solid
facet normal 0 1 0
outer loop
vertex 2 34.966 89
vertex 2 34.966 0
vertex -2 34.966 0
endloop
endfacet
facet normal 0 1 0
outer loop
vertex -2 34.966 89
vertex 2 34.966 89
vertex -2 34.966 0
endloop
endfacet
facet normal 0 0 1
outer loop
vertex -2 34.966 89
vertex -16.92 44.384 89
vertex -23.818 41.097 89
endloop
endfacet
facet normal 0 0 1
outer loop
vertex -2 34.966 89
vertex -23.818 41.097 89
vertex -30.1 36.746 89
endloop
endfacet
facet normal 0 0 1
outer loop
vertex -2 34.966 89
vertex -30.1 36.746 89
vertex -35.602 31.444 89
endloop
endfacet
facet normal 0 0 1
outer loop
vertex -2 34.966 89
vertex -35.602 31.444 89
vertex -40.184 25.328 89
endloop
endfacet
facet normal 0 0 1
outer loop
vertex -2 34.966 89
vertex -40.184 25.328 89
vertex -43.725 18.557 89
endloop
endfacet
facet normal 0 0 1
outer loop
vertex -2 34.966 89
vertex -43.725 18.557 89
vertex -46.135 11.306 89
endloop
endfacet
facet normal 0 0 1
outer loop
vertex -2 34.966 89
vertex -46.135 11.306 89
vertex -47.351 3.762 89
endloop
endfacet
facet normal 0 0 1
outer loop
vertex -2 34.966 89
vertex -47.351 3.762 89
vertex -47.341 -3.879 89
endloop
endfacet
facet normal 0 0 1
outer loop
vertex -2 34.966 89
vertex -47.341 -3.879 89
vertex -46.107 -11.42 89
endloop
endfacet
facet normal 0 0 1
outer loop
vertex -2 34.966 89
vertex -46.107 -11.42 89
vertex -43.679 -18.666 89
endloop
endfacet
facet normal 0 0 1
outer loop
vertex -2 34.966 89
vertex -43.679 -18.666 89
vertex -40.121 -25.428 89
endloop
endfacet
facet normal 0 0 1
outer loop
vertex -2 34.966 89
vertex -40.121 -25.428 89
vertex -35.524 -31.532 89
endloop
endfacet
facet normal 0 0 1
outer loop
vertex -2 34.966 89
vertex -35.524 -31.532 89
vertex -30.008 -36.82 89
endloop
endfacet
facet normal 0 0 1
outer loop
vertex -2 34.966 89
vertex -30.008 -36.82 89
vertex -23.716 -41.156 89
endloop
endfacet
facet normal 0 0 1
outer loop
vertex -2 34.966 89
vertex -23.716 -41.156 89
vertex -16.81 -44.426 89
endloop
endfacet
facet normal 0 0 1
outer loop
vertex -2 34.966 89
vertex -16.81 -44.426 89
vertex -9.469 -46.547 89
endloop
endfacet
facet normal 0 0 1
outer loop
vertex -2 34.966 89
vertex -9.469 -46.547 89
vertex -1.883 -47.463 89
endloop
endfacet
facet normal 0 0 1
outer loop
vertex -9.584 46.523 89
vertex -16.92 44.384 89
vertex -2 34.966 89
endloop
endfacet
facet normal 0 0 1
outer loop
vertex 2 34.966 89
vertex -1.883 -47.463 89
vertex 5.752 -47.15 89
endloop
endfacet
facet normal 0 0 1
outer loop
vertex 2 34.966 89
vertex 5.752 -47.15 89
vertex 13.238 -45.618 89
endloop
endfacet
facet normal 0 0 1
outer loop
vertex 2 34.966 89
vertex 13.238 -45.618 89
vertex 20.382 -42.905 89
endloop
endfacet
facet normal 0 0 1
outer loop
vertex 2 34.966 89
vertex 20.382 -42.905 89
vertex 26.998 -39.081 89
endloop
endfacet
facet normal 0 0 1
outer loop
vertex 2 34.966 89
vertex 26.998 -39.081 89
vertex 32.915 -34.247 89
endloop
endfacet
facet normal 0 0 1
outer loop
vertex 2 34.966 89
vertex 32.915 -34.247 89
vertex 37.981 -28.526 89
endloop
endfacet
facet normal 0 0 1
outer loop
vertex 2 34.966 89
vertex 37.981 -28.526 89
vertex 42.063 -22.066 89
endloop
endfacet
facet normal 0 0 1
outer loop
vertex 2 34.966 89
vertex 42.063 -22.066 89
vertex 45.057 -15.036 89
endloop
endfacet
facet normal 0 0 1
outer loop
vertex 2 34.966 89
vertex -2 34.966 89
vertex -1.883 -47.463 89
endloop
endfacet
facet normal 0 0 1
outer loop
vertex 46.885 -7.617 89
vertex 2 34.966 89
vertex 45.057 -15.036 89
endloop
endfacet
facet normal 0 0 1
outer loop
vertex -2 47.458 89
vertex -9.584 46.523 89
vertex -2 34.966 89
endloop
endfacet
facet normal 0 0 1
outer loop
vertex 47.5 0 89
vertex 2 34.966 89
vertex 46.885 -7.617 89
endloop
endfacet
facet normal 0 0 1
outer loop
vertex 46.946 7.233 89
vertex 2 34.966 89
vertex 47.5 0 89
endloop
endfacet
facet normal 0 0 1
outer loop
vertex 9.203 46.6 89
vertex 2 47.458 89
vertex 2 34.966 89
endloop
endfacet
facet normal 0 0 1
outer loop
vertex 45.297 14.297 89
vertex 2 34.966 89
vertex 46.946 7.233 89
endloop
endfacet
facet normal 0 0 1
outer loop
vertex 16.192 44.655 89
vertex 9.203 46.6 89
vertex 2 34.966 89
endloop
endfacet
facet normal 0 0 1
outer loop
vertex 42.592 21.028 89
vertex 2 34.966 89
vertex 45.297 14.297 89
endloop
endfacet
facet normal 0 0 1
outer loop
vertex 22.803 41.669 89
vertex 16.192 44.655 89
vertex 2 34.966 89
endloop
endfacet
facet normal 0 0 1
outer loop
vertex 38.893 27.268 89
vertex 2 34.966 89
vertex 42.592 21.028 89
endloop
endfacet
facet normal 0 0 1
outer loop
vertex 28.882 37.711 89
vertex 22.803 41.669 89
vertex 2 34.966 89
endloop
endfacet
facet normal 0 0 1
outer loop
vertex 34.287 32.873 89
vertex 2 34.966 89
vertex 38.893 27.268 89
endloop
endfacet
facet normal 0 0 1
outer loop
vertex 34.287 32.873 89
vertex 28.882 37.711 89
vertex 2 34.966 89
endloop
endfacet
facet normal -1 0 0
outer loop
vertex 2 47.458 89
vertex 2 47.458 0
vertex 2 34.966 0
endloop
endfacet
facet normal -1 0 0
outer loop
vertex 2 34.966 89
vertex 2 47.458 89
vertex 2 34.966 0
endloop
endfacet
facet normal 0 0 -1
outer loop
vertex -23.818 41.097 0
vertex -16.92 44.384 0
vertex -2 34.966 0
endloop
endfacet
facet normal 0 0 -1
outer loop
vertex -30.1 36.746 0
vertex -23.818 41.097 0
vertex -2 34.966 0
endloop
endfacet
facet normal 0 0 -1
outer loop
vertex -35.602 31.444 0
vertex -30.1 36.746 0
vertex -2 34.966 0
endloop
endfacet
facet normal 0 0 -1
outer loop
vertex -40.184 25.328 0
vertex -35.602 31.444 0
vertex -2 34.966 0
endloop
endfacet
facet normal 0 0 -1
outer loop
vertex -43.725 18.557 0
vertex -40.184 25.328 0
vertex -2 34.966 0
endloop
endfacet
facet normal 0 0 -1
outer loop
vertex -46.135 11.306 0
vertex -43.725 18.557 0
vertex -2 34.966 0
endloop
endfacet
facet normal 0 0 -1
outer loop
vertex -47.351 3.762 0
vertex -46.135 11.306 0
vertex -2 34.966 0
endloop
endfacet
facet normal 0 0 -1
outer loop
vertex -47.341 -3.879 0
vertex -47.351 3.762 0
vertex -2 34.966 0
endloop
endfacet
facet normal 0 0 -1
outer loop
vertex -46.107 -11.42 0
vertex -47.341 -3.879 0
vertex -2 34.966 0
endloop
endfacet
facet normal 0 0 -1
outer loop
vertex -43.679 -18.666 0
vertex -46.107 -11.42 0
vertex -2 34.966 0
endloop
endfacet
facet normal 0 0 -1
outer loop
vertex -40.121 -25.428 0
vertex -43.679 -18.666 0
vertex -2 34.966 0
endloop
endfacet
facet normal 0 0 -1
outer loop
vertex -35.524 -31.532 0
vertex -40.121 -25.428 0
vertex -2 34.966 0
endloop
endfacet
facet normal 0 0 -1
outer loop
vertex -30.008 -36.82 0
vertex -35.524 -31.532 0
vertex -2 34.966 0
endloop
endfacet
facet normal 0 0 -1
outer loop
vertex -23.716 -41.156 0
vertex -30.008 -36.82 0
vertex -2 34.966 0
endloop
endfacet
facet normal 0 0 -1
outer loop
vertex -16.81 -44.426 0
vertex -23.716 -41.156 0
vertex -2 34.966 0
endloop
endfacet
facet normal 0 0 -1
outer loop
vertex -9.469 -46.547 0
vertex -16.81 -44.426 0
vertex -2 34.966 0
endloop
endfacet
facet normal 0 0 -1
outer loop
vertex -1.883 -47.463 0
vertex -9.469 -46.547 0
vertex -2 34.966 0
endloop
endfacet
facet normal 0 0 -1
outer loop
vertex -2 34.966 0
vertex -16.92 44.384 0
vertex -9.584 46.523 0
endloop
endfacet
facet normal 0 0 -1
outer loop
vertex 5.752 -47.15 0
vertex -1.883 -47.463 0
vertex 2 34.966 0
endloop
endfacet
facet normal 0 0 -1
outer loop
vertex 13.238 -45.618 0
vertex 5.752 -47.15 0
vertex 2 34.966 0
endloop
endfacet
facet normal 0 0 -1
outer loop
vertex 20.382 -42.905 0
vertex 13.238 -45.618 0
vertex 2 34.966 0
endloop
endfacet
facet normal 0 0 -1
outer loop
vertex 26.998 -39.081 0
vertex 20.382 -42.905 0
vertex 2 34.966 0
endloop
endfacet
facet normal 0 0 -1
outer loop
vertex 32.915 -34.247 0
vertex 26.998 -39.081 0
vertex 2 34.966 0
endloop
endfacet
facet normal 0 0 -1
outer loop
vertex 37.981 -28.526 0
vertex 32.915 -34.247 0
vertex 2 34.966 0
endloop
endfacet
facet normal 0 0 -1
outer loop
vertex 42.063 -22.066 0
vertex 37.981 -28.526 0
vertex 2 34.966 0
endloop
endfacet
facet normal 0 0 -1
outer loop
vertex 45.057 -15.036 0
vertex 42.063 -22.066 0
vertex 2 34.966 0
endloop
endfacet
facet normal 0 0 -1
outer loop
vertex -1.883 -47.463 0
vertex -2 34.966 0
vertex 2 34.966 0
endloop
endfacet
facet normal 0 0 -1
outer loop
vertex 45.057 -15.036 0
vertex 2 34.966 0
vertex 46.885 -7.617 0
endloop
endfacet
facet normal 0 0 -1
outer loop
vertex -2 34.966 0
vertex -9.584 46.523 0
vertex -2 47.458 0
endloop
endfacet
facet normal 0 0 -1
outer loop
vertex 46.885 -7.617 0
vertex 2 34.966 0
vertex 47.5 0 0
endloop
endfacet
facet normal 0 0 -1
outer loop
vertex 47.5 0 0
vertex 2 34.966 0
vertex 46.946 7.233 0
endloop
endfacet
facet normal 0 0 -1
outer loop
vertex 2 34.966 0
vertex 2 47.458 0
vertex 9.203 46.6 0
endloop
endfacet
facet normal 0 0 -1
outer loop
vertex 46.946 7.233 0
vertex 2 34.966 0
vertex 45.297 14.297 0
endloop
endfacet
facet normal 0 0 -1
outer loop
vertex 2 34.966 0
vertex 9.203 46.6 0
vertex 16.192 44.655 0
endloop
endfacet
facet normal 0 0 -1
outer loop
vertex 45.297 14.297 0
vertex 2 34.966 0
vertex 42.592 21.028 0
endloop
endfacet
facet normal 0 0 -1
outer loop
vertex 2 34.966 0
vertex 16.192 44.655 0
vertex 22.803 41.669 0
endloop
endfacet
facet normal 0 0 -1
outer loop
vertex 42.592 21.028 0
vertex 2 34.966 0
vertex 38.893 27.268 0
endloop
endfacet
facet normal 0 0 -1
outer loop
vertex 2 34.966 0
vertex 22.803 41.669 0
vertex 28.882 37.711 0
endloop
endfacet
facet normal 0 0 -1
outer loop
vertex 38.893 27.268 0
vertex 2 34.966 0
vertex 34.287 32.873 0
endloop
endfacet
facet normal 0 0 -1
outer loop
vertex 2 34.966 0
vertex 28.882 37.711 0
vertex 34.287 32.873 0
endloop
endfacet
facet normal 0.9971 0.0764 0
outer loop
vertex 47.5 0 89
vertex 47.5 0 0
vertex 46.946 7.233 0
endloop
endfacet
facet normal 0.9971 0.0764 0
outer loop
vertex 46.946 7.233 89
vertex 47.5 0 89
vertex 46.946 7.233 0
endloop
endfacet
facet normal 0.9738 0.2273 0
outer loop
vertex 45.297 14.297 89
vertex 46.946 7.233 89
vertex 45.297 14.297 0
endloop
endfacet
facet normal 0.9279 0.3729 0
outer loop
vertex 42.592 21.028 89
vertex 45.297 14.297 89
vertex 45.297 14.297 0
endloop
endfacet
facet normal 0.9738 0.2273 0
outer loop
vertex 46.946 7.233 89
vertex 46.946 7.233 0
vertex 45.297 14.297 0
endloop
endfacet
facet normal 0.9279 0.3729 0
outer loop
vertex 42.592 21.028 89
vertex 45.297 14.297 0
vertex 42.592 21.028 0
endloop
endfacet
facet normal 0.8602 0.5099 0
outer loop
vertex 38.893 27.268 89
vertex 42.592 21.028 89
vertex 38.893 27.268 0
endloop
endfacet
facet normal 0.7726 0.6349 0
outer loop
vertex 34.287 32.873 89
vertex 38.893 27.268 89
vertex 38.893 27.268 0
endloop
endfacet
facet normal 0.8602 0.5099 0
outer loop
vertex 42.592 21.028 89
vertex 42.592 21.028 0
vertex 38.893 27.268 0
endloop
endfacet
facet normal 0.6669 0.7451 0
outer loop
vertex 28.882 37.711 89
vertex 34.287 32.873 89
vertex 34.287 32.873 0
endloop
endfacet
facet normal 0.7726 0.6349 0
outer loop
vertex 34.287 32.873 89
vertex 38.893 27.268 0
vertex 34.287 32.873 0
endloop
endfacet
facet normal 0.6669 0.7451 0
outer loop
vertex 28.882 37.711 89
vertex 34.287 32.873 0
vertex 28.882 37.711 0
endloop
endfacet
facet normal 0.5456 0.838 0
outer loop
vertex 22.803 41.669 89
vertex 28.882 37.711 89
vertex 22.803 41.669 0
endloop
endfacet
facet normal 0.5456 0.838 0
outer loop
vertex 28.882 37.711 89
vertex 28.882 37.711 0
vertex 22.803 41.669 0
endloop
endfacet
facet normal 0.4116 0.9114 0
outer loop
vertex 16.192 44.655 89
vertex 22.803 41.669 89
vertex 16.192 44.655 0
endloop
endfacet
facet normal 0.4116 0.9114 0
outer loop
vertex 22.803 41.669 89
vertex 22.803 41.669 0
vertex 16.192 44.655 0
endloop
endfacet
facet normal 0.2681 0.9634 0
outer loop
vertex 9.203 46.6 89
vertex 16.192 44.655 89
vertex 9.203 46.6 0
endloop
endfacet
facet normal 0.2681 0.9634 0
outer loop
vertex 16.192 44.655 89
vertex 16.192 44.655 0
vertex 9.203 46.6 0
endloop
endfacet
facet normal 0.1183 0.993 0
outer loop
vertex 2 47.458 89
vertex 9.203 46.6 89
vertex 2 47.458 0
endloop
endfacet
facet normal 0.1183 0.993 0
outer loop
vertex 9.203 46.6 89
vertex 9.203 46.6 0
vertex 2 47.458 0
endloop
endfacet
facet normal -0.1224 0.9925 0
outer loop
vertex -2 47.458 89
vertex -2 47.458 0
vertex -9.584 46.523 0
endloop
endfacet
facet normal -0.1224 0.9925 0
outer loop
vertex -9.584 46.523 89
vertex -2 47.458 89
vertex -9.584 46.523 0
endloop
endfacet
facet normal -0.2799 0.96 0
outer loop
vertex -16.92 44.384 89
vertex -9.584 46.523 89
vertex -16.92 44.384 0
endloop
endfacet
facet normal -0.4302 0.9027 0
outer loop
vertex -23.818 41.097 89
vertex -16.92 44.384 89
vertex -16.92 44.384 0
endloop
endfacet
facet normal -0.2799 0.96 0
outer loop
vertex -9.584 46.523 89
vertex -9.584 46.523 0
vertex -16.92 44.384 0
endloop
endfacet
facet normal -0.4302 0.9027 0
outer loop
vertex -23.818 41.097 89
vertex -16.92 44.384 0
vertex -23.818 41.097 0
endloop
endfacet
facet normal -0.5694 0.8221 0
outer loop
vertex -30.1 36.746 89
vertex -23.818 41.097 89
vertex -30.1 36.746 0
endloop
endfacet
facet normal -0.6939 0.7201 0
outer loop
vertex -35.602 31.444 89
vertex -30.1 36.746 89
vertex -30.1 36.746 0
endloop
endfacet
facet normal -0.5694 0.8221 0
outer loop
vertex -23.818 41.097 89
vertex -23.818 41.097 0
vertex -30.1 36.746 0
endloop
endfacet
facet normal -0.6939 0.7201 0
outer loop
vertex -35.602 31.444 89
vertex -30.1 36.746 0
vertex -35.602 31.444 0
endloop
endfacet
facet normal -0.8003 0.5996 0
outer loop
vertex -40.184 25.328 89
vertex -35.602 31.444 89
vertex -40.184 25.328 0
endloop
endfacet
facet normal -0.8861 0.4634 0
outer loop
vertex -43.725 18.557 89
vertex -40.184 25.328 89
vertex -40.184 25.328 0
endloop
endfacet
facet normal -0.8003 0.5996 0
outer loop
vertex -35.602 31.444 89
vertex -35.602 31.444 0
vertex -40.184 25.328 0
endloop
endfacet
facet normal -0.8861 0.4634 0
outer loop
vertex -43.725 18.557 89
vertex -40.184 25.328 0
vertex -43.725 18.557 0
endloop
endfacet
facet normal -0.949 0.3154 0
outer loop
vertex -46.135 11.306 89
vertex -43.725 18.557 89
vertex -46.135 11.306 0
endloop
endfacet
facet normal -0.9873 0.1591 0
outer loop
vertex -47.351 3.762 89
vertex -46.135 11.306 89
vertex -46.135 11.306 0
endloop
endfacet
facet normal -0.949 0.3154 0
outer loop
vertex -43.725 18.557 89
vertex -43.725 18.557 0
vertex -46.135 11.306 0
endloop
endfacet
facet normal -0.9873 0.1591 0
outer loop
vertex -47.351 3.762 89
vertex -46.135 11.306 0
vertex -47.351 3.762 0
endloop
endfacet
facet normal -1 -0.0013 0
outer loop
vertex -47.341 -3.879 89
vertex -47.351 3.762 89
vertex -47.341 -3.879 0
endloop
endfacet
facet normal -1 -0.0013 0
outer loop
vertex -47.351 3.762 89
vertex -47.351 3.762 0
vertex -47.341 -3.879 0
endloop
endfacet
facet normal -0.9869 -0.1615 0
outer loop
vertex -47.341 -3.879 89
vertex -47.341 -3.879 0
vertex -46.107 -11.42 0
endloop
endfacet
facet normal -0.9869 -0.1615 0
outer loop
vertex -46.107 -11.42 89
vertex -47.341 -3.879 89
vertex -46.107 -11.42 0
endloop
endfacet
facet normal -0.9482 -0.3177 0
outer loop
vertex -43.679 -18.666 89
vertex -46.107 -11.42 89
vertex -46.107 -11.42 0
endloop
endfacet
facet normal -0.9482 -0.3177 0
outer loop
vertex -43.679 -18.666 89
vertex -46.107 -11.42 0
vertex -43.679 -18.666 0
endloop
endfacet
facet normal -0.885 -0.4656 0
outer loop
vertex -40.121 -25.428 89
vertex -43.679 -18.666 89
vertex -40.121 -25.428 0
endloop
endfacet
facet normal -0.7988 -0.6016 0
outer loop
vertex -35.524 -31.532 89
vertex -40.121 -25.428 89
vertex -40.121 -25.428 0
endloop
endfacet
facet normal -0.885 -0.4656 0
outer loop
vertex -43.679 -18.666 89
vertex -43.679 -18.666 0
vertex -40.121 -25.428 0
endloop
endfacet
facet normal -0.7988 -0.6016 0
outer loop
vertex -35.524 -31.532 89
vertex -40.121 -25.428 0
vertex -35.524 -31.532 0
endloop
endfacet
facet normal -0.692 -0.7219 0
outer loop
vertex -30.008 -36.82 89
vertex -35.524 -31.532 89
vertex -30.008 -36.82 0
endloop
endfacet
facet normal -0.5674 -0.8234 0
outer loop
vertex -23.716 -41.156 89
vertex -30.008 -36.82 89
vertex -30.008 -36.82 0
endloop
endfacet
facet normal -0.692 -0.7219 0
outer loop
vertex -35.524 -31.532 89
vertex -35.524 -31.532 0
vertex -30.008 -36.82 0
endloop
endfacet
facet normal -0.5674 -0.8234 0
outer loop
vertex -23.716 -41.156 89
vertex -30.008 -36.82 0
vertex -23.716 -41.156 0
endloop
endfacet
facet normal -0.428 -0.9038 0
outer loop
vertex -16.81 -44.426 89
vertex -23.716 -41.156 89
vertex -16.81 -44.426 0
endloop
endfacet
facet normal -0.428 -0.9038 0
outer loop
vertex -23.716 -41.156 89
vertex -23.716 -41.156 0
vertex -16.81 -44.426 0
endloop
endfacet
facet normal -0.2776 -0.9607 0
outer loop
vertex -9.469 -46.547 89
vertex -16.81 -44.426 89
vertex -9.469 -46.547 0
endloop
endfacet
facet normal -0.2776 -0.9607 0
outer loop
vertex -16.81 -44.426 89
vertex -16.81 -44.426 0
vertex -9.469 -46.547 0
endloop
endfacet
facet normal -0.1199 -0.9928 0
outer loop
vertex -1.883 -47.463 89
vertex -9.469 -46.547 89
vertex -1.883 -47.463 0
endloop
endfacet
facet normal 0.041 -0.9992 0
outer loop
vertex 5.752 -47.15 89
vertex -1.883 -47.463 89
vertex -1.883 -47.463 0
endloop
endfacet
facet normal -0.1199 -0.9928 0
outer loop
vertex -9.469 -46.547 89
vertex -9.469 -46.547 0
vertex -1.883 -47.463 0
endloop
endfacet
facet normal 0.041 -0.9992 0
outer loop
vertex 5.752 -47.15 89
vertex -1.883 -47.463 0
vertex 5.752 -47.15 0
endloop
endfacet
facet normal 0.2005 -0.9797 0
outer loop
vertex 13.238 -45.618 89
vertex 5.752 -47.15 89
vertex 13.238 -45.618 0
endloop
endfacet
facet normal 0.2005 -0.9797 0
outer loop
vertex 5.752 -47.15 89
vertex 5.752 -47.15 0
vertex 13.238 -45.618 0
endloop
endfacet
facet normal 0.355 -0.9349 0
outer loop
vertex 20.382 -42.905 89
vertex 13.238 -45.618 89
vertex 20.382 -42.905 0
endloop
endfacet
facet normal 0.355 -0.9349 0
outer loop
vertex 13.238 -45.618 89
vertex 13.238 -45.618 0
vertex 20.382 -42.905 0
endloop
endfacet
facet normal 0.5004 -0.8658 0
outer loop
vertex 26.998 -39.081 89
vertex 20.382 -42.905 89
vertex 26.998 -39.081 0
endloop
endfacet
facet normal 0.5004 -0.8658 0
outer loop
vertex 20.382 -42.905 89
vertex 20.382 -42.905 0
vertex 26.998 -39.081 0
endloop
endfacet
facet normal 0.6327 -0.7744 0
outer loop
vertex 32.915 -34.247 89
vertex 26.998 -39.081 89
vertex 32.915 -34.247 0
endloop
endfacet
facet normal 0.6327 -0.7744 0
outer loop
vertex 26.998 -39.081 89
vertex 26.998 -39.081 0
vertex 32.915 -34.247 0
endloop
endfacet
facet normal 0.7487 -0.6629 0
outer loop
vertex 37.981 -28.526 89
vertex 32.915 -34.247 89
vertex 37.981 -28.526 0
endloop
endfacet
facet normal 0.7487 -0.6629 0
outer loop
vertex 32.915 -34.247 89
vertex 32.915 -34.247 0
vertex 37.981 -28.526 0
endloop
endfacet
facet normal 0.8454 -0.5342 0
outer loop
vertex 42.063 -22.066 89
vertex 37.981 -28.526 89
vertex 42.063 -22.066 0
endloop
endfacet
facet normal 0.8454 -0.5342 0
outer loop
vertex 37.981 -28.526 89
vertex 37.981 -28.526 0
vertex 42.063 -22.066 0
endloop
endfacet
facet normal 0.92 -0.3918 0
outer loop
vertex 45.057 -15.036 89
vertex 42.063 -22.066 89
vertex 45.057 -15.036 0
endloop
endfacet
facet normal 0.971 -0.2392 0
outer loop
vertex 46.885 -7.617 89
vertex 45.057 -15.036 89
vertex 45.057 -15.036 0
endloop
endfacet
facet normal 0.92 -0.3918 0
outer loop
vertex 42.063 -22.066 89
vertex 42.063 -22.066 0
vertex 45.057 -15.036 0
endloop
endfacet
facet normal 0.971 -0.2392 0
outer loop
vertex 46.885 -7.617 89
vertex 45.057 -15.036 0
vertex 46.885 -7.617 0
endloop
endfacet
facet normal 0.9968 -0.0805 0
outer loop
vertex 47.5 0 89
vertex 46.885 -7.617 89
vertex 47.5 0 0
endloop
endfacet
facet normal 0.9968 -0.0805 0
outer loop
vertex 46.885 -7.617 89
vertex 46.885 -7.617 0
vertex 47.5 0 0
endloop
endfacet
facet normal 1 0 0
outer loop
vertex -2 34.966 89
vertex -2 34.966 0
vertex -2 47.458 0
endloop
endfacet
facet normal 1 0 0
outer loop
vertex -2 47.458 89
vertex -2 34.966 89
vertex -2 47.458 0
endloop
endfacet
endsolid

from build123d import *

# Parameters (mm, degrees)
F1_DEPTH = 89


with BuildPart() as f1:
    # F0 (on Top) → F1 (new body)
    with BuildSketch(Plane.XY):
        with BuildLine():
            ThreePointArc((-2, 47.4578760587), (-32.8728611472, -34.287388352), (47.5, 0))
            ThreePointArc((47.5, 0), (34.287388352, 32.8728611472), (2, 47.4578760587))
            Line((2, 47.4578760587), (2, 34.9655821919))
            Line((2, 34.9655821919), (0, 34.9655821919))
            Line((0, 34.9655821919), (-2, 34.9655821919))
            Line((-2, 34.9655821919), (-2, 47.4578760587))
        make_face()
    extrude(amount=F1_DEPTH)


solid = f1.part
